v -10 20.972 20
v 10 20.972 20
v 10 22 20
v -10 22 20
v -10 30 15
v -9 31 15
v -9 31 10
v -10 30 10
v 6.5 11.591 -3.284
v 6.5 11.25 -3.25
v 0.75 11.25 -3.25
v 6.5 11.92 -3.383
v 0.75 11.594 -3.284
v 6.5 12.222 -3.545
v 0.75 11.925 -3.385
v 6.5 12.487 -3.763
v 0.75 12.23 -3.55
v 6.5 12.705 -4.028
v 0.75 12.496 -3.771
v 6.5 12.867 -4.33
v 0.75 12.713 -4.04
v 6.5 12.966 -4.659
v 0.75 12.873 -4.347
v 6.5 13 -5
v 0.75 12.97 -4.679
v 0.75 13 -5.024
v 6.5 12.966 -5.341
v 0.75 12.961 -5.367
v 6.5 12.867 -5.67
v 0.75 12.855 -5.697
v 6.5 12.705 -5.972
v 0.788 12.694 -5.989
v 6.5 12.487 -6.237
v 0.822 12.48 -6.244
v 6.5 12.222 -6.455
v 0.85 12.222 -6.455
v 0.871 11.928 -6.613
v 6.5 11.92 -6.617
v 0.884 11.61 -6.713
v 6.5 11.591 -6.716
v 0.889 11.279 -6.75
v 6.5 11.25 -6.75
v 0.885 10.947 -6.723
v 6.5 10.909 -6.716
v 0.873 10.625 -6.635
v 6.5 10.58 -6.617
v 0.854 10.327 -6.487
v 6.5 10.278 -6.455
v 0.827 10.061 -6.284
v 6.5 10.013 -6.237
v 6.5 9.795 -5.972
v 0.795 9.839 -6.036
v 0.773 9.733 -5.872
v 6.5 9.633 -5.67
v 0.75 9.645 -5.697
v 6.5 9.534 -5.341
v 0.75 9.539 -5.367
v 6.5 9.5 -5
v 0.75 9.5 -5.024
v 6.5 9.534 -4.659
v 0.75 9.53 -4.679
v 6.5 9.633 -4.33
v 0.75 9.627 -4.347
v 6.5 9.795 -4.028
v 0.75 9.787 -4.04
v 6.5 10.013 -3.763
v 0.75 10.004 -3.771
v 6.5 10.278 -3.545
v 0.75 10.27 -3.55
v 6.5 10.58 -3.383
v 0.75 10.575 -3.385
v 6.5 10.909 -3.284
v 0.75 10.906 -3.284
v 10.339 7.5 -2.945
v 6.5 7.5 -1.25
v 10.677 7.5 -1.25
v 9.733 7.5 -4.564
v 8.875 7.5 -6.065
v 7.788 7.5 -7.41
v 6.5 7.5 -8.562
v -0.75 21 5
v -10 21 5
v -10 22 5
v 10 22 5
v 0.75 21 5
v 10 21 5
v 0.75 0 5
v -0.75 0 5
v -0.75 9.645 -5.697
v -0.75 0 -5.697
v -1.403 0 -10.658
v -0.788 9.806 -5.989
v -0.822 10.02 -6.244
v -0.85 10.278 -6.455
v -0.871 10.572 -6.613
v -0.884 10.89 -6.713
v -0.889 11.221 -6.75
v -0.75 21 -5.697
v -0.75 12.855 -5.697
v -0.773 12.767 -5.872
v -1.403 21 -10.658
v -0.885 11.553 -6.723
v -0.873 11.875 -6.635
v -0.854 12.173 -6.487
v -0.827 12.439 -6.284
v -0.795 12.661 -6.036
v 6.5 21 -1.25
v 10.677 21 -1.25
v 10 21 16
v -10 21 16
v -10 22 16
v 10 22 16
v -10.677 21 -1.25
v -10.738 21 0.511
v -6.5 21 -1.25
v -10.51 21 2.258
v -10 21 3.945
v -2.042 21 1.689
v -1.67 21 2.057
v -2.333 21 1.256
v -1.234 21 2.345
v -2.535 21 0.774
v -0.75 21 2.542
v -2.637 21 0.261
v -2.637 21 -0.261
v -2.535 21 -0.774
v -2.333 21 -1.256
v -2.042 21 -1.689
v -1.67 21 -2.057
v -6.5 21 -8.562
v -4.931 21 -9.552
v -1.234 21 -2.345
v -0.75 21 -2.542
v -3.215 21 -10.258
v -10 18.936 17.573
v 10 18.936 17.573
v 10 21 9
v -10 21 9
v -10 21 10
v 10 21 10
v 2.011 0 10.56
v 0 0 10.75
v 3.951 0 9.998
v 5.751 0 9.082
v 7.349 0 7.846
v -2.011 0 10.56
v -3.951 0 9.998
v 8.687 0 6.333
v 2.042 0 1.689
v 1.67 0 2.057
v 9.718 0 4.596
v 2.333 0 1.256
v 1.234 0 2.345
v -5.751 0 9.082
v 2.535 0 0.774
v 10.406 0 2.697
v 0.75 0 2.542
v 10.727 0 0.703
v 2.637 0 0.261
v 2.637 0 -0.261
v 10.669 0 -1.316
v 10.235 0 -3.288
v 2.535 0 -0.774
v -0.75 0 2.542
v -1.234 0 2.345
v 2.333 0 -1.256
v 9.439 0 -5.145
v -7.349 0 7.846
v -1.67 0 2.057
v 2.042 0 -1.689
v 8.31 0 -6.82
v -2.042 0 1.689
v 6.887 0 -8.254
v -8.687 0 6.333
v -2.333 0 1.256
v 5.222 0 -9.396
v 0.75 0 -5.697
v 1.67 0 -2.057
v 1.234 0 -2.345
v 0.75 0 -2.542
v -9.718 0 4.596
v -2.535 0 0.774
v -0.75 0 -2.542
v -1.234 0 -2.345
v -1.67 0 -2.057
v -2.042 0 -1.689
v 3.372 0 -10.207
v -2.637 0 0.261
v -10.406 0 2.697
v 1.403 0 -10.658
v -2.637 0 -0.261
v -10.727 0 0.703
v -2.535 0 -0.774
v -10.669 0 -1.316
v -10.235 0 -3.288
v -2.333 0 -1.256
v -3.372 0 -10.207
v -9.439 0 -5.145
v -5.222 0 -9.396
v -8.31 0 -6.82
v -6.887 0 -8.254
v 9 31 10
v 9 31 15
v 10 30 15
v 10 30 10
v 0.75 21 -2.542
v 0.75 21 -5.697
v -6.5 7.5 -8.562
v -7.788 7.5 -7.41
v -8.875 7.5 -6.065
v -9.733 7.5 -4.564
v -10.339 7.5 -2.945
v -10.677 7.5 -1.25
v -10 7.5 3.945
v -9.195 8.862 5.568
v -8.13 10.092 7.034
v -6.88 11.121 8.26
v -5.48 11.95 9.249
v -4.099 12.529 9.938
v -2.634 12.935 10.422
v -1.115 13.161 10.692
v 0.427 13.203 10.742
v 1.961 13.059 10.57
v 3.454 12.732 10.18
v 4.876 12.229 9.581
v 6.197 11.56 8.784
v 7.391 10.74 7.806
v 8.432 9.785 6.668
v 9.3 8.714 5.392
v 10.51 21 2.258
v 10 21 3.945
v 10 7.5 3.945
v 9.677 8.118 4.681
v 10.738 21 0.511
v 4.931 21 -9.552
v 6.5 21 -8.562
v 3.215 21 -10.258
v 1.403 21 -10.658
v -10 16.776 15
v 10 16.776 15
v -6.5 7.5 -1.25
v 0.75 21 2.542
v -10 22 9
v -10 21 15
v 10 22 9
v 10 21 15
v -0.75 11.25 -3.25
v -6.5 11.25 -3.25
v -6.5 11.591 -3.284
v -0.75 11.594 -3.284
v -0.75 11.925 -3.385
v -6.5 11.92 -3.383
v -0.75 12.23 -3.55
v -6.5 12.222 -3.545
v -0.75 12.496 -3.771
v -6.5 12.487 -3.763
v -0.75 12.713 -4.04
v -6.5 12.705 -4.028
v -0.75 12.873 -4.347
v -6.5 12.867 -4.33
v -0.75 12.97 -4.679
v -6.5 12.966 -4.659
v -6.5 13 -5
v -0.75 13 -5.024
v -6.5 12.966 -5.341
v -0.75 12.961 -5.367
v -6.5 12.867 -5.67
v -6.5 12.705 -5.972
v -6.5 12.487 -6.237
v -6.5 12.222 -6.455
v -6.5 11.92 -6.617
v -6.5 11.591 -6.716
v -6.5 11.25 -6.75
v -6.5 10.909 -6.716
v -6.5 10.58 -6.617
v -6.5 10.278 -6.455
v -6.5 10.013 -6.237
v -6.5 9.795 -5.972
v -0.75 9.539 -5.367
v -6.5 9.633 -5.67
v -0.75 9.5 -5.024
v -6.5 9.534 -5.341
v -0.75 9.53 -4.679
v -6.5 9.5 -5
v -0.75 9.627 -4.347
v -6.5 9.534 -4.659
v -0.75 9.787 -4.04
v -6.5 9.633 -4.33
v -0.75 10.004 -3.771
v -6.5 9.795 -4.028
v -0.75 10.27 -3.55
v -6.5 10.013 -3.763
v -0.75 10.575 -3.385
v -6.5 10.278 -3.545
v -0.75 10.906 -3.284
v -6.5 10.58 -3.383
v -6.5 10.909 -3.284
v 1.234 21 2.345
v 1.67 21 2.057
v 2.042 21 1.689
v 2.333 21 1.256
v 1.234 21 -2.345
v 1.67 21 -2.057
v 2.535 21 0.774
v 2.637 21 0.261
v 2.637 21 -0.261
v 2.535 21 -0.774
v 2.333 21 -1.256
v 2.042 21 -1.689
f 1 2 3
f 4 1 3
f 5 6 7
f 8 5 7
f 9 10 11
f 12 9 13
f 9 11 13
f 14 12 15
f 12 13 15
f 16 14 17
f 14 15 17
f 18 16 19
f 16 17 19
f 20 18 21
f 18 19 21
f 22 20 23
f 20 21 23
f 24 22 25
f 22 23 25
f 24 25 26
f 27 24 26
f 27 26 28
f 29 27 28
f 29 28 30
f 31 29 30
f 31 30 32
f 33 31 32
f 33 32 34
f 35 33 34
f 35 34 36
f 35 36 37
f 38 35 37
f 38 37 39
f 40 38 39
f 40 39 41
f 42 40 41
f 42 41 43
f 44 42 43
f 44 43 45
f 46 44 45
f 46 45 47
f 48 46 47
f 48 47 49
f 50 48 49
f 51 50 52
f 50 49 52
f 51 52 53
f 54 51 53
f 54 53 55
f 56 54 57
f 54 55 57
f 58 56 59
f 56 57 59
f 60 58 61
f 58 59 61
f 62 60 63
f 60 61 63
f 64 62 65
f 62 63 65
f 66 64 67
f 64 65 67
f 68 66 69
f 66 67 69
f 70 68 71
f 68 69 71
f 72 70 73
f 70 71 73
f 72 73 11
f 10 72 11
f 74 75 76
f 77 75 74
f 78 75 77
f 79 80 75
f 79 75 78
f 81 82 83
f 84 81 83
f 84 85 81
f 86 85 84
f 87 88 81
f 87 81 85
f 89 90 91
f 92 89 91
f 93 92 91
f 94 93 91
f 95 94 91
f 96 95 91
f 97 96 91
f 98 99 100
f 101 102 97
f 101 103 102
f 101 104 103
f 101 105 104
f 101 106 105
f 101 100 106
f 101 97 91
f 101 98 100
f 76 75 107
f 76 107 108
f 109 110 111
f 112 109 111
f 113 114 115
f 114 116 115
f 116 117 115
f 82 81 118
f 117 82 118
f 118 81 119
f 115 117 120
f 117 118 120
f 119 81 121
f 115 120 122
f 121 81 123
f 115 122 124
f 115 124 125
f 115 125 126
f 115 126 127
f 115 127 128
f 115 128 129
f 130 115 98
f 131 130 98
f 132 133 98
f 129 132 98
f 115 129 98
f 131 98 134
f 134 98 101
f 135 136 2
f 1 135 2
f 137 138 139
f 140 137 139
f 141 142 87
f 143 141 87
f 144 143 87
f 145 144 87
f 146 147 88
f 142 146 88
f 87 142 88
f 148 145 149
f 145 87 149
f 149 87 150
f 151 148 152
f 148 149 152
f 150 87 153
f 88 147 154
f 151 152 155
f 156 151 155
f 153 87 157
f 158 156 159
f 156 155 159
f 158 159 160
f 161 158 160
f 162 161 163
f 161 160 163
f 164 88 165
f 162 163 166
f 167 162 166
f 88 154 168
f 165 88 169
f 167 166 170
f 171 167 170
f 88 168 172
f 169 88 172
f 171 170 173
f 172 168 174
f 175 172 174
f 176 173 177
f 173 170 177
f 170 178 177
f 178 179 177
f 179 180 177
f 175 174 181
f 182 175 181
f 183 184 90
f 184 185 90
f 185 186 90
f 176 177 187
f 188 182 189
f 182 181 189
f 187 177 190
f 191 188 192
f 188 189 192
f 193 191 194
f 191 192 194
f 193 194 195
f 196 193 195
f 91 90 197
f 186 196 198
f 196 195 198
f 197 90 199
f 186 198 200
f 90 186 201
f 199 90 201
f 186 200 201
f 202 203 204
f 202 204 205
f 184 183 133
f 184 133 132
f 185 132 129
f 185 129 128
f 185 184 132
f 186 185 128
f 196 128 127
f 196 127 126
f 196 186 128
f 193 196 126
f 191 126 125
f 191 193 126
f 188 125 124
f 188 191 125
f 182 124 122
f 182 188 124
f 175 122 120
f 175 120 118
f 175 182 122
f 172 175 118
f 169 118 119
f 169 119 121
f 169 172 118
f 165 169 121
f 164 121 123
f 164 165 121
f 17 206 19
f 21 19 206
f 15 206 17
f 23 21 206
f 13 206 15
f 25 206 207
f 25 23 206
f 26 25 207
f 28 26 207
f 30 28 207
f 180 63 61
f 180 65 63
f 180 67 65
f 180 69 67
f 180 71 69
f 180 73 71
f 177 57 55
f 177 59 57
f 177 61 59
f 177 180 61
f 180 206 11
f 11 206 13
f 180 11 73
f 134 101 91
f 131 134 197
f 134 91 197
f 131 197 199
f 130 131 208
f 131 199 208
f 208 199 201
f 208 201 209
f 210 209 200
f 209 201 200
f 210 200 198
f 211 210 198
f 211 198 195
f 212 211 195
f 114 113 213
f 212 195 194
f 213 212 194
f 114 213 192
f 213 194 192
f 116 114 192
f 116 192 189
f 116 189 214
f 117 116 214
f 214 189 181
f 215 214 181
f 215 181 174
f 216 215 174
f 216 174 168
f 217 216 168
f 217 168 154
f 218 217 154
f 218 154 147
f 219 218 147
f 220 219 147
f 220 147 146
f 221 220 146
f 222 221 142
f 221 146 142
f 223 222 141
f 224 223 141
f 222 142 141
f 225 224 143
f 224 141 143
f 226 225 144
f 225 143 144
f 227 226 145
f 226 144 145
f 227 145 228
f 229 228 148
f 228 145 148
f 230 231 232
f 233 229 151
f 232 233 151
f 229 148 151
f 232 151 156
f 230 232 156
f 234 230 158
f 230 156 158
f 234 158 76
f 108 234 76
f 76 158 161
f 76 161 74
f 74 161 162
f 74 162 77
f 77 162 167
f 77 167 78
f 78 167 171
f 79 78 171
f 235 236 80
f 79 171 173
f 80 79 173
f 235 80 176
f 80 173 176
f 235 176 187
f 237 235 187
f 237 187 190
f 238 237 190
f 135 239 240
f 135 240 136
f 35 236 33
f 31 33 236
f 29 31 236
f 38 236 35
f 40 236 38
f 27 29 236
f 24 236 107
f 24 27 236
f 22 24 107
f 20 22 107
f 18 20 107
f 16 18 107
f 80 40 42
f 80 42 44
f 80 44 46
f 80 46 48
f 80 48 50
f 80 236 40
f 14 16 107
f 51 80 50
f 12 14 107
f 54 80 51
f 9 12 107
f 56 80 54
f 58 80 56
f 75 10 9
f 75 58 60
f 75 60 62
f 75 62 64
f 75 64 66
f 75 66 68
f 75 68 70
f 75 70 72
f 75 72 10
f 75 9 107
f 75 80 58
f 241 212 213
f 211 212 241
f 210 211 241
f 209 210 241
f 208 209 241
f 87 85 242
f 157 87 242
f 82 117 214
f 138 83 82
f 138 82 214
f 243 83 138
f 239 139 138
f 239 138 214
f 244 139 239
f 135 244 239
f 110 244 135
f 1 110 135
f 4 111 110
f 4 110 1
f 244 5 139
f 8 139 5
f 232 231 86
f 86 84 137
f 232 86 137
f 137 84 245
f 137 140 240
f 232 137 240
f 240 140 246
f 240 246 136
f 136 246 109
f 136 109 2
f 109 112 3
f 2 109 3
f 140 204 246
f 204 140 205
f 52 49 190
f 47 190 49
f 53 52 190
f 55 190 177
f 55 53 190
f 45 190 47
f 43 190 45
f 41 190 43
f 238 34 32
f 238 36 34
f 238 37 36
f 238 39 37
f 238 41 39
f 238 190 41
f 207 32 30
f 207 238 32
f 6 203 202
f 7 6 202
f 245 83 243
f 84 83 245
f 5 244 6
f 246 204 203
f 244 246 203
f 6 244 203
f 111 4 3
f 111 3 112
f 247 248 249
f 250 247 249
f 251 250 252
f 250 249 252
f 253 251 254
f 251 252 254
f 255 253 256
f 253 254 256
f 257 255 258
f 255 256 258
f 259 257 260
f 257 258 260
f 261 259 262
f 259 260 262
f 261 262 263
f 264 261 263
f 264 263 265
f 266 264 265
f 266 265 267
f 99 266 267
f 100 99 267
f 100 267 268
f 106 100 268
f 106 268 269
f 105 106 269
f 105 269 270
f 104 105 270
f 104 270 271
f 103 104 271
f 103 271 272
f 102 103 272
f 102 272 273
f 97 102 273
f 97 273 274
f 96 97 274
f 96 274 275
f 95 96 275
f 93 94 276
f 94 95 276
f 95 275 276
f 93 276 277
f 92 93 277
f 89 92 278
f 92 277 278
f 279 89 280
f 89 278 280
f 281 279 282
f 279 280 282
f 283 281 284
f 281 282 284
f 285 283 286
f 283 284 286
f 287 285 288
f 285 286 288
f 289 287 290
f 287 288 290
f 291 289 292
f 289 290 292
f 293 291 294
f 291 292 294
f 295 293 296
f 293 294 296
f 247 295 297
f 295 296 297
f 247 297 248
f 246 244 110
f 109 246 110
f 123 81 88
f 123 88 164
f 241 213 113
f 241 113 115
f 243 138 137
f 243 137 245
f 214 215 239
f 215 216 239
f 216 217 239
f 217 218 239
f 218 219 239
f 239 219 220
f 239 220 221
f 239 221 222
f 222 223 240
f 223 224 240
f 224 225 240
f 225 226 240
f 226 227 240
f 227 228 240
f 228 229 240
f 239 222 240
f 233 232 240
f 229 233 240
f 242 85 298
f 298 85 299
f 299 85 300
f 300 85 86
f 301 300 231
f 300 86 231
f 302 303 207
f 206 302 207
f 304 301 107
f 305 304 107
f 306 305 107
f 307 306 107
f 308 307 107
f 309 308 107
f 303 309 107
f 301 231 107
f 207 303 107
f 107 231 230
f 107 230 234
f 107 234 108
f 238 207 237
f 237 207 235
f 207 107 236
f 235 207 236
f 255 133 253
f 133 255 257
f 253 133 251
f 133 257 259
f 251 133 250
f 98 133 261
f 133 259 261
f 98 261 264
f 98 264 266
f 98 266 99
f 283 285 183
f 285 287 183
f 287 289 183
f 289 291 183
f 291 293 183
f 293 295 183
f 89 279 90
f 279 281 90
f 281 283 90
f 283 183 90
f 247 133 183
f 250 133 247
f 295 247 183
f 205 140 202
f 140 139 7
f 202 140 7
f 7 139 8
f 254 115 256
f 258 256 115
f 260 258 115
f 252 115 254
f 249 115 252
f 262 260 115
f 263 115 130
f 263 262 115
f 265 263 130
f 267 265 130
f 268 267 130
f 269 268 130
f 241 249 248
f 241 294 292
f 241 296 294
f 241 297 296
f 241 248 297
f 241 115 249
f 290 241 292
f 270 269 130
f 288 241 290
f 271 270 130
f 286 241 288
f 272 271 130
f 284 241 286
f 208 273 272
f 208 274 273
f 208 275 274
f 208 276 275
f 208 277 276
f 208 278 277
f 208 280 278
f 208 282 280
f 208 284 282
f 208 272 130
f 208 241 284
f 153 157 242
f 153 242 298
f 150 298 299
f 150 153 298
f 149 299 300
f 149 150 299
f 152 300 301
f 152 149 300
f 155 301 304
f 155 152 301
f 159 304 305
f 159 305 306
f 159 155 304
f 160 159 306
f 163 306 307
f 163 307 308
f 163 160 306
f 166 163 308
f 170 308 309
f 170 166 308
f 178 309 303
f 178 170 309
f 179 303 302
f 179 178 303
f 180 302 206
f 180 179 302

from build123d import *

# Parameters (mm, degrees)
SKICA1_R                      = 10.75
SKICA1_R_2                    = 2.65
P_IDAT_VYSUNUT_M1_DEPTH       = 21
ODEBRAT_VYSUNUT_M1_DEPTH      = 26.925373671
ODEBRAT_VYSUNUT_M1_DEPTH_BACK = 26.925373671
SKICA2_W                      = 1.5
SKICA2_H                      = 14.75
ODEBRAT_START                 = -13.5
ODEBRAT_VYSUNUT_M2_DEPTH      = 13.5
SKICA5_R                      = 1.75
ODEBRAT_VYSUNUT_M3_DEPTH      = 30.22541702
P_IDAT_VYSUNUT_M3_DEPTH       = 10
SKICA2_2_W                    = 1.5
SKICA2_2_H                    = 14.75
ODEBRAT_VYSUNUT_M4_DEPTH      = 28.95643933
P_IDAT_VYSUNUT_M6_DEPTH       = 20
ZKOSEN_1_SIZE                 = 1
SKICA9_W                      = 20
SKICA9_H                      = 2.57342531
SKICA9_H_2                    = 5
P_IDAT_VYSUNUT_M5_DEPTH       = 1
SKICA11_W                     = 1.5
SKICA11_H                     = 1
ODEBRAT_VYSUNUT_M5_DEPTH      = 30.41747401
ODEBRAT_VYSUNUT_M6_DEPTH      = 30.41747401
P_IDAT_VYSUNUT_M7_DEPTH       = 20
SKICA15_W                     = 1
SKICA15_H                     = 1
ODEBRAT_VYSUNUT_M8_DEPTH      = 43.326853179


with BuildPart() as part:
    # Skica1 → Přidat vysunutím1 (new body)
    with BuildSketch(Plane(origin=(0, 0, 0), x_dir=(1, 0, 0), z_dir=(0, 1, 0))):
        with Locations(Location((0, 0, 0), (0, 0, 90))):
            Circle(SKICA1_R)
        with Locations(Location((0, 0, 0), (0, 0, 90))):
            Circle(SKICA1_R_2, mode=Mode.SUBTRACT)
    extrude(amount=P_IDAT_VYSUNUT_M1_DEPTH)

    # Skica2 → Odebrat vysunutím1 (cut, two sides: drawn at the far end of the back side and taken through both)
    with BuildSketch(Plane(origin=(0, 21, 0), x_dir=(1, 0, 0), z_dir=(0, 1, 0)).offset(-ODEBRAT_VYSUNUT_M1_DEPTH_BACK)):
        with Locations((0, 3.375)):
            Rectangle(SKICA2_W, SKICA2_H)
    extrude(amount=ODEBRAT_VYSUNUT_M1_DEPTH + ODEBRAT_VYSUNUT_M1_DEPTH_BACK, mode=Mode.SUBTRACT)

    # Skica4 → Odebrat vysunutím2 (cut)
    with BuildSketch(Plane(origin=(0, 21, 0), x_dir=(1, 0, 0), z_dir=(0, 1, 0)).offset(ODEBRAT_START)):
        with BuildLine():
            ThreePointArc((-6.5, 8.562271895), (-9.334363095, 5.332182069), (-10.677078252, 1.25))
            Line((-10.677078252, 1.25), (-6.5, 1.25))
            Line((-6.5, 1.25), (-6.5, 8.562271895))
        make_face()
        with BuildLine():
            Line((6.5, 1.25), (10.677078252, 1.25))
            ThreePointArc((10.677078252, 1.25), (9.334363095, 5.332182069), (6.5, 8.562271895))
            Line((6.5, 8.562271895), (6.5, 1.25))
        make_face()
    extrude(amount=ODEBRAT_VYSUNUT_M2_DEPTH, mode=Mode.SUBTRACT)

    # Skica5 → Odebrat vysunutím3 (cut, through all)
    with BuildSketch(Plane.ZY.offset(6.5)):
        with Locations((-5, 11.25)):
            Circle(SKICA5_R)
    extrude(amount=-ODEBRAT_VYSUNUT_M3_DEPTH, mode=Mode.SUBTRACT)

    # Skica6 → Přidat vysunutím3 (add, symmetric)
    with BuildSketch(Plane(origin=(0, 0, 0), x_dir=(0, 0, -1), z_dir=(1, 0, 0))):
        Polygon((-15, 31), (-10, 31), (-10, 21), (-3.94493346, 21), (-3.94493346, 7.5), (-15, 16.776302257), align=None)
    extrude(amount=P_IDAT_VYSUNUT_M3_DEPTH, both=True)

    # Skica2<2> → Odebrat vysunutím4 (cut, through all)
    with BuildSketch(Plane(origin=(0, 21, 0), x_dir=(1, 0, 0), z_dir=(0, 1, 0))):
        with Locations((0, 3.375)):
            Rectangle(SKICA2_2_W, SKICA2_2_H)
    extrude(amount=-ODEBRAT_VYSUNUT_M4_DEPTH, mode=Mode.SUBTRACT)

    # Skica8 → Přidat vysunutím6 (add)
    with BuildSketch(Plane(origin=(10, 0, 0), x_dir=(0, 0, -1), z_dir=(1, 0, 0))):
        Polygon((-15, 16.776302257), (-17.57342531, 18.935662485), (-17.57342531, 21), (-15, 21), align=None)
    extrude(amount=-P_IDAT_VYSUNUT_M6_DEPTH)

    # Zkosení1
    zkosen_1_edges = [part.edges().sort_by_distance(p)[0] for p in [
        (10, 31, 12.5),
        (-10, 31, 12.5),
    ]]
    chamfer(zkosen_1_edges, length=ZKOSEN_1_SIZE)

    # Skica9 → Přidat vysunutím5 (add)
    with BuildSketch(Plane(origin=(0, 21, 0), x_dir=(1, 0, 0), z_dir=(0, 1, 0))):
        with Locations((0, -16.286712655)):
            Rectangle(SKICA9_W, SKICA9_H)
        with Locations((0, -7.5)):
            Rectangle(SKICA9_W, SKICA9_H_2)
    extrude(amount=P_IDAT_VYSUNUT_M5_DEPTH)

    # Skica11 → Odebrat vysunutím5 (cut, through all)
    with BuildSketch(Plane(origin=(0, 21, 0), x_dir=(1, 0, 0), z_dir=(0, 1, 0))):
        with Locations((0, -4.5)):
            Rectangle(SKICA11_W, SKICA11_H)
    extrude(amount=-ODEBRAT_VYSUNUT_M5_DEPTH, mode=Mode.SUBTRACT)

    # Skica12 → Odebrat vysunutím6 (cut, through all)
    with BuildSketch(Plane(origin=(0, 21, 0), x_dir=(1, 0, 0), z_dir=(0, 1, 0))):
        Polygon((0, 0), (-1.415264349, 10.75), (1.415264349, 10.75), align=None)
    extrude(amount=-ODEBRAT_VYSUNUT_M6_DEPTH, mode=Mode.SUBTRACT)

    # Skica13 → Přidat vysunutím7 (add)
    with BuildSketch(Plane(origin=(10, 0, 0), x_dir=(0, 0, -1), z_dir=(1, 0, 0))):
        Polygon((-17.57342531, 18.935662485), (-20, 20.971800413), (-20, 22), (-17.57342531, 22), align=None)
    extrude(amount=-P_IDAT_VYSUNUT_M7_DEPTH)

    # Skica15 → Odebrat vysunutím8 (cut, through all)
    with BuildSketch(Plane.ZY.offset(10)):
        with Locations((9.5, 21.5)):
            Rectangle(SKICA15_W, SKICA15_H)
        with Locations((15.5, 21.5)):
            Rectangle(SKICA15_W, SKICA15_H)
    extrude(amount=-ODEBRAT_VYSUNUT_M8_DEPTH, mode=Mode.SUBTRACT)


solid = part.part
